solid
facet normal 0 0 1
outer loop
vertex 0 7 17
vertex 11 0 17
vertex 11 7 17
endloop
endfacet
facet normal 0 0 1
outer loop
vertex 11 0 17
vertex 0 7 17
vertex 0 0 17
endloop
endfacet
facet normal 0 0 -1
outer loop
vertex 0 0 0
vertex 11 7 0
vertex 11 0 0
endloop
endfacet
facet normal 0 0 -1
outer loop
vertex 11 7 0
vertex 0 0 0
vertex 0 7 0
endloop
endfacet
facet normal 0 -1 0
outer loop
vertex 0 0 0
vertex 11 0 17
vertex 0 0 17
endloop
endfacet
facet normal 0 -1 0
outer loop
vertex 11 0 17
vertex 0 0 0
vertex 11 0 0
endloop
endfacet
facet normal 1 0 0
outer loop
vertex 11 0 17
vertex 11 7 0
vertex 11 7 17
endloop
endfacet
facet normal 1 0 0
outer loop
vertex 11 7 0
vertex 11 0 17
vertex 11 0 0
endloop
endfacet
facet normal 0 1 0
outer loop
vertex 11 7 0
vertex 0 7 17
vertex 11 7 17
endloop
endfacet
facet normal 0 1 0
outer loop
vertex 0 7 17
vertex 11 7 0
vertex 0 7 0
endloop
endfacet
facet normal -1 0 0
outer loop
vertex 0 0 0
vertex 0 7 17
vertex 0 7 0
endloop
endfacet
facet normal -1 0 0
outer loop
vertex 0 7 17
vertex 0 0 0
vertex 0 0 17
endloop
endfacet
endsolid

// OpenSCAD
// Generated by SolidPython 1.0.1 on 2020-07-29 00:46:55


cube(size = [11, 7, 17]);
/***********************************************
*********      SolidPython code:      **********
************************************************
 
# import packages: SolidPython
from solid import *
from solid.utils import *
from itertools import chain, combinations, permutations


class Resize:

    def __init__(self, scad_file):
        self.scad_file = scad_file
        #self.scad_file = import_scad(scad_file)
        # cone/cylinder param:
        self.r1 = 0
        self.r2 = 0
        self.h = 0
        # rectangular prism param:
        self.w = 0
        self.l = 0
        # ellipse param:
        self.r = 0

    # import OpenScad code (file name corresponds to shape)


    # classify shape + parameters
    def assign(self, param1, param2, param3):
        if self.scad_file == 'cone.scad':
            self.r1 = param1
            self.r2 = param2
            self.h = param3
        elif self.scad_file == 'cylinder.scad':
            self.r1 = param1
            self.r2 = param2
            self.h = param3
        elif self.scad_file == 'rectangularPrism.scad':
            self.h = param1
            self.l = param2
            self.w = param3
        else:
            self.r = param1
            self.h = param2

    # resize parameters
    def iterate(self):
        x = range(3, 20, 2)
        i = 1
        if self.scad_file == 'cone.scad':
            tempList = list(permutations(x, 2))
            for temp in tempList:
                param1 = temp[0]
                param2 = temp[1]
                filepath = 'produced_scad_files/' + 'cone' + str(param1) + '_' + str(param2) + '_' + '.scad'
                scad_render_to_file(cylinder(h=param1, r1=param2, r2=0), filepath)

        elif self.scad_file == 'cylinder.scad':
            tempList = list(permutations(x, 3))
            for temp in tempList:
                param1 = temp[0]
                param2 = temp[1]
                filepath = 'produced_scad_files/' + 'cylinder' + str(param1) + '_' + str(param2) + '_' + '.scad'
                scad_render_to_file(cylinder(h=param1, r1=param2, r2=param2), filepath)

        elif self.scad_file == 'rectangularPrism.scad':
            tempList = list(permutations(x, 3))
            for temp in tempList:
                param1 = temp[0]
                param2 = temp[1]
                param3 = temp[2]
                filepath = 'produced_scad_files/' + 'rectangularPrism' + str(param1) + '_' + str(param2) + '_' + str(
                    param3) + '.scad'
                scad_render_to_file(cube(size=(param1, param2, param3)), filepath)

        elif self.scad_file == 'ellipse.scad':
            tempList = list(permutations(x, 4))
            for temp in tempList:
                param1 = temp[0]
                param2 = temp[1]
                param3 = temp[2]
                param4 = temp[3]
                filepath = 'produced_scad_files/' + 'ellipse' + str(param1) + '_' + str(param2) + '_' + str(param3) + '_' + str(param4) + '.scad'
                scad_render_to_file(scale([param1, param2, param3])(sphere(r=param4)), filepath)

    def render_to_scadfile(self):
        scad_render_to_file(scad, 'example.scad') 
 
************************************************/
